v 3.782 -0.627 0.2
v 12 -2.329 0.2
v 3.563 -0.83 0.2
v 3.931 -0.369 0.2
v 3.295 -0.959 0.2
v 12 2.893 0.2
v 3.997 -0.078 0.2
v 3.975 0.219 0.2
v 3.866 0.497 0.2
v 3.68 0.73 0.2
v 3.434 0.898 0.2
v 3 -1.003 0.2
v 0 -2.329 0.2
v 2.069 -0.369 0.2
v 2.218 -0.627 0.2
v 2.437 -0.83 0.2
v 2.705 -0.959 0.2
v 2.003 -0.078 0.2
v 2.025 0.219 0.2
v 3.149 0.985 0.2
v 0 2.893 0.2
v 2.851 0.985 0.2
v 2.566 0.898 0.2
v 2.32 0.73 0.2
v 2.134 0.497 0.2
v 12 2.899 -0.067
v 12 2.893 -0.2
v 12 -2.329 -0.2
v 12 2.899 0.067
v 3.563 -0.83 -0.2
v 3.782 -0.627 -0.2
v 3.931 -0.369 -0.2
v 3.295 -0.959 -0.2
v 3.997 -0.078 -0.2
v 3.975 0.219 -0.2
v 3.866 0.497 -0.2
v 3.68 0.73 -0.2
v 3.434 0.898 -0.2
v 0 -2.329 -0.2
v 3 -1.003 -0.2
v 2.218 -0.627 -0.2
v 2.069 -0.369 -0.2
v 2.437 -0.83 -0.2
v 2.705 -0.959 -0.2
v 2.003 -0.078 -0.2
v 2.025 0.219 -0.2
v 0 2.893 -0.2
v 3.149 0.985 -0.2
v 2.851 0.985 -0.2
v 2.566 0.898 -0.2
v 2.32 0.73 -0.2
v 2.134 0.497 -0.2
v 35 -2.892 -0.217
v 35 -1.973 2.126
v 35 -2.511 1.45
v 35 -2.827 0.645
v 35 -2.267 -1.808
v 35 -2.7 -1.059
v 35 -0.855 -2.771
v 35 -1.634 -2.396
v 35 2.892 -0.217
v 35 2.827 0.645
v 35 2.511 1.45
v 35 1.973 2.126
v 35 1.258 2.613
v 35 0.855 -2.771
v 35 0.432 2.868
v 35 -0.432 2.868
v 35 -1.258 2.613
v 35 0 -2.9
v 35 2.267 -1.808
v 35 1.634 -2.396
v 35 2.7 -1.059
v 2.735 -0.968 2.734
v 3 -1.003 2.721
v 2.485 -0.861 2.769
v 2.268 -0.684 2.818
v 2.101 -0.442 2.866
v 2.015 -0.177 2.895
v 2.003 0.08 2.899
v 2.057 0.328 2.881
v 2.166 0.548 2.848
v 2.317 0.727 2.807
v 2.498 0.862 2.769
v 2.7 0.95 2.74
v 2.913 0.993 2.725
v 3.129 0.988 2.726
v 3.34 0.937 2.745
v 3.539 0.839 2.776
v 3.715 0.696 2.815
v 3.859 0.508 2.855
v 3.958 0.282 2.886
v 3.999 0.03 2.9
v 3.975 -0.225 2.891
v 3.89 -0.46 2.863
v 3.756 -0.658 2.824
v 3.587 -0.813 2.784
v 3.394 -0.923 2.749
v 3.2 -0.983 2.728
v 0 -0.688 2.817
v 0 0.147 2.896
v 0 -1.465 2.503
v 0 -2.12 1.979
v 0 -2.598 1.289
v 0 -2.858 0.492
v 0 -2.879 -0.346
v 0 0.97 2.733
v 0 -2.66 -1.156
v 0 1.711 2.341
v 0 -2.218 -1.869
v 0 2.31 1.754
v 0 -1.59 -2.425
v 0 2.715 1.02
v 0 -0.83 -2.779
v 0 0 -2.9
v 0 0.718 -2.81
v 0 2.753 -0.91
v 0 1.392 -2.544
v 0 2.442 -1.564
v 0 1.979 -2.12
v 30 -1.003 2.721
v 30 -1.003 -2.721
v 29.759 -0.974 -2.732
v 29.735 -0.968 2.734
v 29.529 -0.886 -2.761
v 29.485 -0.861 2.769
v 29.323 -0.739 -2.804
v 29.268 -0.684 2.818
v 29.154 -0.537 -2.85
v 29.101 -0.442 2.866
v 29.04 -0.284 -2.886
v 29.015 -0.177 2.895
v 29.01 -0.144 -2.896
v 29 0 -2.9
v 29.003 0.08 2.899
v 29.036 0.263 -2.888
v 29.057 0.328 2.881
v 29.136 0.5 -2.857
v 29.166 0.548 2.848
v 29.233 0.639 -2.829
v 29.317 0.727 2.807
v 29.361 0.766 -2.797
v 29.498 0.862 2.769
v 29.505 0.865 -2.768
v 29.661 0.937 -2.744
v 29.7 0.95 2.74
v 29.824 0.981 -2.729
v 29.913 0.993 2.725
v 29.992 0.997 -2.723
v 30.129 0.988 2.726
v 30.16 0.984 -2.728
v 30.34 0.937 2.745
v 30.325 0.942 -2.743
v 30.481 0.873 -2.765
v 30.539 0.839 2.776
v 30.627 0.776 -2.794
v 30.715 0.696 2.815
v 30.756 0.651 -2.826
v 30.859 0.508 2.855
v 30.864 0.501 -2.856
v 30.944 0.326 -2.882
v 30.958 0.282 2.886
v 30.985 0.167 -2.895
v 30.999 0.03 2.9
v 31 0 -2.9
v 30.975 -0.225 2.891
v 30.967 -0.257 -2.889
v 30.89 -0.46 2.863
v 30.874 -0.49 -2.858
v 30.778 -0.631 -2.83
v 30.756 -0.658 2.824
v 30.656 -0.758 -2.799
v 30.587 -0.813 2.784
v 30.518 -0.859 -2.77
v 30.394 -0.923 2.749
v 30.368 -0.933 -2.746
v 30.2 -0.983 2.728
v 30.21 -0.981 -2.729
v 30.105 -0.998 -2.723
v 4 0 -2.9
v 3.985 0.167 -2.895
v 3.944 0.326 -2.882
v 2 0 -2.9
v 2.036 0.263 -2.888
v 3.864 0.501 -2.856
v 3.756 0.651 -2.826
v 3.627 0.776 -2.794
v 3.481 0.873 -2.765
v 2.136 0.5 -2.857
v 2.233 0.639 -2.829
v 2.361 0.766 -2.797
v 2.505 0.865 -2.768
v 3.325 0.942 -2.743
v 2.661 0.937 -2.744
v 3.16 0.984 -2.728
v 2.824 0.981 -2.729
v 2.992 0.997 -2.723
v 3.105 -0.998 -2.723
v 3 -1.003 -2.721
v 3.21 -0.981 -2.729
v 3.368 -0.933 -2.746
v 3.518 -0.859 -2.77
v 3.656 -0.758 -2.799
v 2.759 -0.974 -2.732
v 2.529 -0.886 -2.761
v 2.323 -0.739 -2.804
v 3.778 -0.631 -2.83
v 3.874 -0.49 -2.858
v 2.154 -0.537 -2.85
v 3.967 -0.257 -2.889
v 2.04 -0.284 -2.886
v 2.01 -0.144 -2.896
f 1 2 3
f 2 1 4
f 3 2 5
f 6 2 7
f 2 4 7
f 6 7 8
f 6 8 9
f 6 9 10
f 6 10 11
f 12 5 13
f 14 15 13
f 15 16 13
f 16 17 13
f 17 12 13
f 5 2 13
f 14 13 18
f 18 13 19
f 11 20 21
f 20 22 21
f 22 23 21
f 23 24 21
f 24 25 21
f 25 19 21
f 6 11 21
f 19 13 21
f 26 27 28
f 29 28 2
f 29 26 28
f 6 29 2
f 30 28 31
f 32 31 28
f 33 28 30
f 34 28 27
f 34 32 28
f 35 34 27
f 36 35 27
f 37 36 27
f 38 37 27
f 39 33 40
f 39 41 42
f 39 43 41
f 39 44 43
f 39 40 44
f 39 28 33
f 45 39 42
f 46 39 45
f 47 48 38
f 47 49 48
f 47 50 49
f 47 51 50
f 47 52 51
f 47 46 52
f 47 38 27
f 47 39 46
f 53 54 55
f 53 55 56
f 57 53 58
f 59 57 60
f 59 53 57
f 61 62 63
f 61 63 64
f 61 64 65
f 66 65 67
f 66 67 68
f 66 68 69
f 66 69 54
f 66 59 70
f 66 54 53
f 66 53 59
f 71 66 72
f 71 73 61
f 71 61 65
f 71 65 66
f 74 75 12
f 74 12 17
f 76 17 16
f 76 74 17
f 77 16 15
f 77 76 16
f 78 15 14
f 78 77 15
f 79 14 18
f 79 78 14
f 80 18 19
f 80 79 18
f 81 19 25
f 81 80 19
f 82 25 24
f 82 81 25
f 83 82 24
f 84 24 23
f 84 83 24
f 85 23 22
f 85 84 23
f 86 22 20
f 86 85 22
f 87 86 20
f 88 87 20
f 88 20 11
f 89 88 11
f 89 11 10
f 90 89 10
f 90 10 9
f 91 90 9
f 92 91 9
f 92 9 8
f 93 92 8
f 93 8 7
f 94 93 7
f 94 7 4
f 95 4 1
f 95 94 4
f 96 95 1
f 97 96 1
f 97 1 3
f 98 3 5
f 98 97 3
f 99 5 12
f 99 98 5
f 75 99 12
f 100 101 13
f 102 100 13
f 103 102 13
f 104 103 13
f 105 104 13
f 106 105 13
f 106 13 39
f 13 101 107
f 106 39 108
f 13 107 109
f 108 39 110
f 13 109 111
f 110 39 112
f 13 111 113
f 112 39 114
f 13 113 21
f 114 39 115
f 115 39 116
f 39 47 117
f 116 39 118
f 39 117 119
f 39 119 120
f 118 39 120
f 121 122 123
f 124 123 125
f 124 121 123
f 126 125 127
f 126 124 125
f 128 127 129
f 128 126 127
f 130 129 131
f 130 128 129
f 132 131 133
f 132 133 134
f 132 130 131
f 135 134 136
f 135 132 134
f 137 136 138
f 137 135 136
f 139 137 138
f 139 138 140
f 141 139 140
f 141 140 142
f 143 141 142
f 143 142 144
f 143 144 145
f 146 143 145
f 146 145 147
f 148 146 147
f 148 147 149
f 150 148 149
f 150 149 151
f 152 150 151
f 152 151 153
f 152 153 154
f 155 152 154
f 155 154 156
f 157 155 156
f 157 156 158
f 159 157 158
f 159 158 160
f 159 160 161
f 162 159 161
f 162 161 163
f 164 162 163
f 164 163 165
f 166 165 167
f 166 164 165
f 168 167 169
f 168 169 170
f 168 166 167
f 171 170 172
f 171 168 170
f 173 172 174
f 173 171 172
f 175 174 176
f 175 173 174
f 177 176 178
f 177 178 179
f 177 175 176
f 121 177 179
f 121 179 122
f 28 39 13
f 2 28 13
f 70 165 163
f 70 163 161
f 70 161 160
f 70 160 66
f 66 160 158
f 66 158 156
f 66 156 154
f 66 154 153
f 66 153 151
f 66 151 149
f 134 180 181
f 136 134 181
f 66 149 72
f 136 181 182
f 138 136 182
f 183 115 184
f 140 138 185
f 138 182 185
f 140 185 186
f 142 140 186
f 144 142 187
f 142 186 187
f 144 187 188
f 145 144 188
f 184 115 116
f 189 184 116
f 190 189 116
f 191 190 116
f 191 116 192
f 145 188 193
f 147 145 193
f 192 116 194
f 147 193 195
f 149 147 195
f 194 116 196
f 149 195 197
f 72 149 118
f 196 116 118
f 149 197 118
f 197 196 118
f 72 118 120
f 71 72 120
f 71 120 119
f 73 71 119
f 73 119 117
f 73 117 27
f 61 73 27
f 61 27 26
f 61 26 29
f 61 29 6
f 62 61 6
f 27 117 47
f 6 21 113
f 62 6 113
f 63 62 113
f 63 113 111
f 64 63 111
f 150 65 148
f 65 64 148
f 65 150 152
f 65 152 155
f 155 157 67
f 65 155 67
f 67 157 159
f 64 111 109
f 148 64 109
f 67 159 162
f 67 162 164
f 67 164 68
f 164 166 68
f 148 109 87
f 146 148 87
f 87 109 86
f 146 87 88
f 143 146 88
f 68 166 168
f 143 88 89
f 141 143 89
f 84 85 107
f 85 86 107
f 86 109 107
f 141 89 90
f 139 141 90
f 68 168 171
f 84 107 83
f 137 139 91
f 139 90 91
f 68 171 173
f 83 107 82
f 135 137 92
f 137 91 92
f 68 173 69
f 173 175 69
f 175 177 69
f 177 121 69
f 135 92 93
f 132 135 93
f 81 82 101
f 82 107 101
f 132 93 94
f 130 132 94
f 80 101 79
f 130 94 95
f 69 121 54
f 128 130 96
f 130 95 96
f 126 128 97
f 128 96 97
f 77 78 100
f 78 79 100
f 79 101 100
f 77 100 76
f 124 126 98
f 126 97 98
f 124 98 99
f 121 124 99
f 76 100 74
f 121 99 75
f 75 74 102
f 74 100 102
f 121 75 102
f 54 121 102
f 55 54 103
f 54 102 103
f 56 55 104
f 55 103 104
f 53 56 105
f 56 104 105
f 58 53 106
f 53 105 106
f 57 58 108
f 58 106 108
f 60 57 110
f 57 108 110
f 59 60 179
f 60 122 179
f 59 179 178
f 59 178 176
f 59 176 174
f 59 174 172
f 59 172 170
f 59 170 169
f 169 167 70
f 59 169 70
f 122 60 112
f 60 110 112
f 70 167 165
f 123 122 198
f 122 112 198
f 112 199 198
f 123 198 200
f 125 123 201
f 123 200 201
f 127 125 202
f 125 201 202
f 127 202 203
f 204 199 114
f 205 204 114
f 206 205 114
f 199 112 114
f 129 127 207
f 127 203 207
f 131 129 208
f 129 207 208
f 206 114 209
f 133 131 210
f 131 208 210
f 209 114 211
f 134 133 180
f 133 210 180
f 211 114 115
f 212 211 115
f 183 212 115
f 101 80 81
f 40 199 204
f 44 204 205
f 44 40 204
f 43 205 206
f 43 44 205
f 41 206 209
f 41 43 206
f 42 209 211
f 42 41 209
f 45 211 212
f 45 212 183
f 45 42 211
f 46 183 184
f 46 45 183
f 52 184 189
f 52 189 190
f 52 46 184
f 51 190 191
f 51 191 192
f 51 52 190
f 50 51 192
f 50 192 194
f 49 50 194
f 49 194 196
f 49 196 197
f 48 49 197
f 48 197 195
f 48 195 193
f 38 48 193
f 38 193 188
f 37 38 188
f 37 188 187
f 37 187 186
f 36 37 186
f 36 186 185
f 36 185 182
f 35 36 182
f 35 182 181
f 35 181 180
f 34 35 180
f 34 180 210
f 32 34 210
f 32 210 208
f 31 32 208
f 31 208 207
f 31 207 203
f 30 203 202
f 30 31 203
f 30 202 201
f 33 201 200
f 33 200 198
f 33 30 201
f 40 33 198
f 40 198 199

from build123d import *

# Parameters (mm, degrees)
SKETCH_1_R               = 2.9
EXTRUDE_1_DEPTH          = 35
SKETCH_2_W               = 0.4
SKETCH_2_H               = 5.450532248
CUT_EXTRUDE_1_DEPTH      = 12
CUT_EXTRUDE_2_DEPTH      = 10
CUT_EXTRUDE_2_DEPTH_BACK = 10
SKETCH_3_R               = 1


with BuildPart() as part:
    # 草图1 → 凸台-拉伸1 (new body)
    with BuildSketch(Plane(origin=(0, 0, 0), x_dir=(0, 0, -1), z_dir=(1, 0, 0))):
        Circle(SKETCH_1_R)
    extrude(amount=EXTRUDE_1_DEPTH)

    # 草图2 → 切除-拉伸1 (cut)
    with BuildSketch(Plane.ZY):
        with Locations((0, 0.396255312)):
            Rectangle(SKETCH_2_W, SKETCH_2_H)
    extrude(amount=-CUT_EXTRUDE_1_DEPTH, mode=Mode.SUBTRACT)

    # 草图3 → 切除-拉伸2 (cut, two sides: drawn at the far end of the back side and taken through both)
    with BuildSketch(Plane(origin=(0, 0, 0.2), x_dir=(-1, 0, 0), z_dir=(0, 0, -1)).offset(-CUT_EXTRUDE_2_DEPTH_BACK)):
        with Locations(Location((-3, -0.003452386, 0), (0, 0, 270))):
            Circle(SKETCH_3_R)
        with Locations(Location((-30, -0.003452386, 0), (0, 0, 270))):
            Circle(SKETCH_3_R)
    extrude(amount=CUT_EXTRUDE_2_DEPTH + CUT_EXTRUDE_2_DEPTH_BACK, mode=Mode.SUBTRACT)


solid = part.part
